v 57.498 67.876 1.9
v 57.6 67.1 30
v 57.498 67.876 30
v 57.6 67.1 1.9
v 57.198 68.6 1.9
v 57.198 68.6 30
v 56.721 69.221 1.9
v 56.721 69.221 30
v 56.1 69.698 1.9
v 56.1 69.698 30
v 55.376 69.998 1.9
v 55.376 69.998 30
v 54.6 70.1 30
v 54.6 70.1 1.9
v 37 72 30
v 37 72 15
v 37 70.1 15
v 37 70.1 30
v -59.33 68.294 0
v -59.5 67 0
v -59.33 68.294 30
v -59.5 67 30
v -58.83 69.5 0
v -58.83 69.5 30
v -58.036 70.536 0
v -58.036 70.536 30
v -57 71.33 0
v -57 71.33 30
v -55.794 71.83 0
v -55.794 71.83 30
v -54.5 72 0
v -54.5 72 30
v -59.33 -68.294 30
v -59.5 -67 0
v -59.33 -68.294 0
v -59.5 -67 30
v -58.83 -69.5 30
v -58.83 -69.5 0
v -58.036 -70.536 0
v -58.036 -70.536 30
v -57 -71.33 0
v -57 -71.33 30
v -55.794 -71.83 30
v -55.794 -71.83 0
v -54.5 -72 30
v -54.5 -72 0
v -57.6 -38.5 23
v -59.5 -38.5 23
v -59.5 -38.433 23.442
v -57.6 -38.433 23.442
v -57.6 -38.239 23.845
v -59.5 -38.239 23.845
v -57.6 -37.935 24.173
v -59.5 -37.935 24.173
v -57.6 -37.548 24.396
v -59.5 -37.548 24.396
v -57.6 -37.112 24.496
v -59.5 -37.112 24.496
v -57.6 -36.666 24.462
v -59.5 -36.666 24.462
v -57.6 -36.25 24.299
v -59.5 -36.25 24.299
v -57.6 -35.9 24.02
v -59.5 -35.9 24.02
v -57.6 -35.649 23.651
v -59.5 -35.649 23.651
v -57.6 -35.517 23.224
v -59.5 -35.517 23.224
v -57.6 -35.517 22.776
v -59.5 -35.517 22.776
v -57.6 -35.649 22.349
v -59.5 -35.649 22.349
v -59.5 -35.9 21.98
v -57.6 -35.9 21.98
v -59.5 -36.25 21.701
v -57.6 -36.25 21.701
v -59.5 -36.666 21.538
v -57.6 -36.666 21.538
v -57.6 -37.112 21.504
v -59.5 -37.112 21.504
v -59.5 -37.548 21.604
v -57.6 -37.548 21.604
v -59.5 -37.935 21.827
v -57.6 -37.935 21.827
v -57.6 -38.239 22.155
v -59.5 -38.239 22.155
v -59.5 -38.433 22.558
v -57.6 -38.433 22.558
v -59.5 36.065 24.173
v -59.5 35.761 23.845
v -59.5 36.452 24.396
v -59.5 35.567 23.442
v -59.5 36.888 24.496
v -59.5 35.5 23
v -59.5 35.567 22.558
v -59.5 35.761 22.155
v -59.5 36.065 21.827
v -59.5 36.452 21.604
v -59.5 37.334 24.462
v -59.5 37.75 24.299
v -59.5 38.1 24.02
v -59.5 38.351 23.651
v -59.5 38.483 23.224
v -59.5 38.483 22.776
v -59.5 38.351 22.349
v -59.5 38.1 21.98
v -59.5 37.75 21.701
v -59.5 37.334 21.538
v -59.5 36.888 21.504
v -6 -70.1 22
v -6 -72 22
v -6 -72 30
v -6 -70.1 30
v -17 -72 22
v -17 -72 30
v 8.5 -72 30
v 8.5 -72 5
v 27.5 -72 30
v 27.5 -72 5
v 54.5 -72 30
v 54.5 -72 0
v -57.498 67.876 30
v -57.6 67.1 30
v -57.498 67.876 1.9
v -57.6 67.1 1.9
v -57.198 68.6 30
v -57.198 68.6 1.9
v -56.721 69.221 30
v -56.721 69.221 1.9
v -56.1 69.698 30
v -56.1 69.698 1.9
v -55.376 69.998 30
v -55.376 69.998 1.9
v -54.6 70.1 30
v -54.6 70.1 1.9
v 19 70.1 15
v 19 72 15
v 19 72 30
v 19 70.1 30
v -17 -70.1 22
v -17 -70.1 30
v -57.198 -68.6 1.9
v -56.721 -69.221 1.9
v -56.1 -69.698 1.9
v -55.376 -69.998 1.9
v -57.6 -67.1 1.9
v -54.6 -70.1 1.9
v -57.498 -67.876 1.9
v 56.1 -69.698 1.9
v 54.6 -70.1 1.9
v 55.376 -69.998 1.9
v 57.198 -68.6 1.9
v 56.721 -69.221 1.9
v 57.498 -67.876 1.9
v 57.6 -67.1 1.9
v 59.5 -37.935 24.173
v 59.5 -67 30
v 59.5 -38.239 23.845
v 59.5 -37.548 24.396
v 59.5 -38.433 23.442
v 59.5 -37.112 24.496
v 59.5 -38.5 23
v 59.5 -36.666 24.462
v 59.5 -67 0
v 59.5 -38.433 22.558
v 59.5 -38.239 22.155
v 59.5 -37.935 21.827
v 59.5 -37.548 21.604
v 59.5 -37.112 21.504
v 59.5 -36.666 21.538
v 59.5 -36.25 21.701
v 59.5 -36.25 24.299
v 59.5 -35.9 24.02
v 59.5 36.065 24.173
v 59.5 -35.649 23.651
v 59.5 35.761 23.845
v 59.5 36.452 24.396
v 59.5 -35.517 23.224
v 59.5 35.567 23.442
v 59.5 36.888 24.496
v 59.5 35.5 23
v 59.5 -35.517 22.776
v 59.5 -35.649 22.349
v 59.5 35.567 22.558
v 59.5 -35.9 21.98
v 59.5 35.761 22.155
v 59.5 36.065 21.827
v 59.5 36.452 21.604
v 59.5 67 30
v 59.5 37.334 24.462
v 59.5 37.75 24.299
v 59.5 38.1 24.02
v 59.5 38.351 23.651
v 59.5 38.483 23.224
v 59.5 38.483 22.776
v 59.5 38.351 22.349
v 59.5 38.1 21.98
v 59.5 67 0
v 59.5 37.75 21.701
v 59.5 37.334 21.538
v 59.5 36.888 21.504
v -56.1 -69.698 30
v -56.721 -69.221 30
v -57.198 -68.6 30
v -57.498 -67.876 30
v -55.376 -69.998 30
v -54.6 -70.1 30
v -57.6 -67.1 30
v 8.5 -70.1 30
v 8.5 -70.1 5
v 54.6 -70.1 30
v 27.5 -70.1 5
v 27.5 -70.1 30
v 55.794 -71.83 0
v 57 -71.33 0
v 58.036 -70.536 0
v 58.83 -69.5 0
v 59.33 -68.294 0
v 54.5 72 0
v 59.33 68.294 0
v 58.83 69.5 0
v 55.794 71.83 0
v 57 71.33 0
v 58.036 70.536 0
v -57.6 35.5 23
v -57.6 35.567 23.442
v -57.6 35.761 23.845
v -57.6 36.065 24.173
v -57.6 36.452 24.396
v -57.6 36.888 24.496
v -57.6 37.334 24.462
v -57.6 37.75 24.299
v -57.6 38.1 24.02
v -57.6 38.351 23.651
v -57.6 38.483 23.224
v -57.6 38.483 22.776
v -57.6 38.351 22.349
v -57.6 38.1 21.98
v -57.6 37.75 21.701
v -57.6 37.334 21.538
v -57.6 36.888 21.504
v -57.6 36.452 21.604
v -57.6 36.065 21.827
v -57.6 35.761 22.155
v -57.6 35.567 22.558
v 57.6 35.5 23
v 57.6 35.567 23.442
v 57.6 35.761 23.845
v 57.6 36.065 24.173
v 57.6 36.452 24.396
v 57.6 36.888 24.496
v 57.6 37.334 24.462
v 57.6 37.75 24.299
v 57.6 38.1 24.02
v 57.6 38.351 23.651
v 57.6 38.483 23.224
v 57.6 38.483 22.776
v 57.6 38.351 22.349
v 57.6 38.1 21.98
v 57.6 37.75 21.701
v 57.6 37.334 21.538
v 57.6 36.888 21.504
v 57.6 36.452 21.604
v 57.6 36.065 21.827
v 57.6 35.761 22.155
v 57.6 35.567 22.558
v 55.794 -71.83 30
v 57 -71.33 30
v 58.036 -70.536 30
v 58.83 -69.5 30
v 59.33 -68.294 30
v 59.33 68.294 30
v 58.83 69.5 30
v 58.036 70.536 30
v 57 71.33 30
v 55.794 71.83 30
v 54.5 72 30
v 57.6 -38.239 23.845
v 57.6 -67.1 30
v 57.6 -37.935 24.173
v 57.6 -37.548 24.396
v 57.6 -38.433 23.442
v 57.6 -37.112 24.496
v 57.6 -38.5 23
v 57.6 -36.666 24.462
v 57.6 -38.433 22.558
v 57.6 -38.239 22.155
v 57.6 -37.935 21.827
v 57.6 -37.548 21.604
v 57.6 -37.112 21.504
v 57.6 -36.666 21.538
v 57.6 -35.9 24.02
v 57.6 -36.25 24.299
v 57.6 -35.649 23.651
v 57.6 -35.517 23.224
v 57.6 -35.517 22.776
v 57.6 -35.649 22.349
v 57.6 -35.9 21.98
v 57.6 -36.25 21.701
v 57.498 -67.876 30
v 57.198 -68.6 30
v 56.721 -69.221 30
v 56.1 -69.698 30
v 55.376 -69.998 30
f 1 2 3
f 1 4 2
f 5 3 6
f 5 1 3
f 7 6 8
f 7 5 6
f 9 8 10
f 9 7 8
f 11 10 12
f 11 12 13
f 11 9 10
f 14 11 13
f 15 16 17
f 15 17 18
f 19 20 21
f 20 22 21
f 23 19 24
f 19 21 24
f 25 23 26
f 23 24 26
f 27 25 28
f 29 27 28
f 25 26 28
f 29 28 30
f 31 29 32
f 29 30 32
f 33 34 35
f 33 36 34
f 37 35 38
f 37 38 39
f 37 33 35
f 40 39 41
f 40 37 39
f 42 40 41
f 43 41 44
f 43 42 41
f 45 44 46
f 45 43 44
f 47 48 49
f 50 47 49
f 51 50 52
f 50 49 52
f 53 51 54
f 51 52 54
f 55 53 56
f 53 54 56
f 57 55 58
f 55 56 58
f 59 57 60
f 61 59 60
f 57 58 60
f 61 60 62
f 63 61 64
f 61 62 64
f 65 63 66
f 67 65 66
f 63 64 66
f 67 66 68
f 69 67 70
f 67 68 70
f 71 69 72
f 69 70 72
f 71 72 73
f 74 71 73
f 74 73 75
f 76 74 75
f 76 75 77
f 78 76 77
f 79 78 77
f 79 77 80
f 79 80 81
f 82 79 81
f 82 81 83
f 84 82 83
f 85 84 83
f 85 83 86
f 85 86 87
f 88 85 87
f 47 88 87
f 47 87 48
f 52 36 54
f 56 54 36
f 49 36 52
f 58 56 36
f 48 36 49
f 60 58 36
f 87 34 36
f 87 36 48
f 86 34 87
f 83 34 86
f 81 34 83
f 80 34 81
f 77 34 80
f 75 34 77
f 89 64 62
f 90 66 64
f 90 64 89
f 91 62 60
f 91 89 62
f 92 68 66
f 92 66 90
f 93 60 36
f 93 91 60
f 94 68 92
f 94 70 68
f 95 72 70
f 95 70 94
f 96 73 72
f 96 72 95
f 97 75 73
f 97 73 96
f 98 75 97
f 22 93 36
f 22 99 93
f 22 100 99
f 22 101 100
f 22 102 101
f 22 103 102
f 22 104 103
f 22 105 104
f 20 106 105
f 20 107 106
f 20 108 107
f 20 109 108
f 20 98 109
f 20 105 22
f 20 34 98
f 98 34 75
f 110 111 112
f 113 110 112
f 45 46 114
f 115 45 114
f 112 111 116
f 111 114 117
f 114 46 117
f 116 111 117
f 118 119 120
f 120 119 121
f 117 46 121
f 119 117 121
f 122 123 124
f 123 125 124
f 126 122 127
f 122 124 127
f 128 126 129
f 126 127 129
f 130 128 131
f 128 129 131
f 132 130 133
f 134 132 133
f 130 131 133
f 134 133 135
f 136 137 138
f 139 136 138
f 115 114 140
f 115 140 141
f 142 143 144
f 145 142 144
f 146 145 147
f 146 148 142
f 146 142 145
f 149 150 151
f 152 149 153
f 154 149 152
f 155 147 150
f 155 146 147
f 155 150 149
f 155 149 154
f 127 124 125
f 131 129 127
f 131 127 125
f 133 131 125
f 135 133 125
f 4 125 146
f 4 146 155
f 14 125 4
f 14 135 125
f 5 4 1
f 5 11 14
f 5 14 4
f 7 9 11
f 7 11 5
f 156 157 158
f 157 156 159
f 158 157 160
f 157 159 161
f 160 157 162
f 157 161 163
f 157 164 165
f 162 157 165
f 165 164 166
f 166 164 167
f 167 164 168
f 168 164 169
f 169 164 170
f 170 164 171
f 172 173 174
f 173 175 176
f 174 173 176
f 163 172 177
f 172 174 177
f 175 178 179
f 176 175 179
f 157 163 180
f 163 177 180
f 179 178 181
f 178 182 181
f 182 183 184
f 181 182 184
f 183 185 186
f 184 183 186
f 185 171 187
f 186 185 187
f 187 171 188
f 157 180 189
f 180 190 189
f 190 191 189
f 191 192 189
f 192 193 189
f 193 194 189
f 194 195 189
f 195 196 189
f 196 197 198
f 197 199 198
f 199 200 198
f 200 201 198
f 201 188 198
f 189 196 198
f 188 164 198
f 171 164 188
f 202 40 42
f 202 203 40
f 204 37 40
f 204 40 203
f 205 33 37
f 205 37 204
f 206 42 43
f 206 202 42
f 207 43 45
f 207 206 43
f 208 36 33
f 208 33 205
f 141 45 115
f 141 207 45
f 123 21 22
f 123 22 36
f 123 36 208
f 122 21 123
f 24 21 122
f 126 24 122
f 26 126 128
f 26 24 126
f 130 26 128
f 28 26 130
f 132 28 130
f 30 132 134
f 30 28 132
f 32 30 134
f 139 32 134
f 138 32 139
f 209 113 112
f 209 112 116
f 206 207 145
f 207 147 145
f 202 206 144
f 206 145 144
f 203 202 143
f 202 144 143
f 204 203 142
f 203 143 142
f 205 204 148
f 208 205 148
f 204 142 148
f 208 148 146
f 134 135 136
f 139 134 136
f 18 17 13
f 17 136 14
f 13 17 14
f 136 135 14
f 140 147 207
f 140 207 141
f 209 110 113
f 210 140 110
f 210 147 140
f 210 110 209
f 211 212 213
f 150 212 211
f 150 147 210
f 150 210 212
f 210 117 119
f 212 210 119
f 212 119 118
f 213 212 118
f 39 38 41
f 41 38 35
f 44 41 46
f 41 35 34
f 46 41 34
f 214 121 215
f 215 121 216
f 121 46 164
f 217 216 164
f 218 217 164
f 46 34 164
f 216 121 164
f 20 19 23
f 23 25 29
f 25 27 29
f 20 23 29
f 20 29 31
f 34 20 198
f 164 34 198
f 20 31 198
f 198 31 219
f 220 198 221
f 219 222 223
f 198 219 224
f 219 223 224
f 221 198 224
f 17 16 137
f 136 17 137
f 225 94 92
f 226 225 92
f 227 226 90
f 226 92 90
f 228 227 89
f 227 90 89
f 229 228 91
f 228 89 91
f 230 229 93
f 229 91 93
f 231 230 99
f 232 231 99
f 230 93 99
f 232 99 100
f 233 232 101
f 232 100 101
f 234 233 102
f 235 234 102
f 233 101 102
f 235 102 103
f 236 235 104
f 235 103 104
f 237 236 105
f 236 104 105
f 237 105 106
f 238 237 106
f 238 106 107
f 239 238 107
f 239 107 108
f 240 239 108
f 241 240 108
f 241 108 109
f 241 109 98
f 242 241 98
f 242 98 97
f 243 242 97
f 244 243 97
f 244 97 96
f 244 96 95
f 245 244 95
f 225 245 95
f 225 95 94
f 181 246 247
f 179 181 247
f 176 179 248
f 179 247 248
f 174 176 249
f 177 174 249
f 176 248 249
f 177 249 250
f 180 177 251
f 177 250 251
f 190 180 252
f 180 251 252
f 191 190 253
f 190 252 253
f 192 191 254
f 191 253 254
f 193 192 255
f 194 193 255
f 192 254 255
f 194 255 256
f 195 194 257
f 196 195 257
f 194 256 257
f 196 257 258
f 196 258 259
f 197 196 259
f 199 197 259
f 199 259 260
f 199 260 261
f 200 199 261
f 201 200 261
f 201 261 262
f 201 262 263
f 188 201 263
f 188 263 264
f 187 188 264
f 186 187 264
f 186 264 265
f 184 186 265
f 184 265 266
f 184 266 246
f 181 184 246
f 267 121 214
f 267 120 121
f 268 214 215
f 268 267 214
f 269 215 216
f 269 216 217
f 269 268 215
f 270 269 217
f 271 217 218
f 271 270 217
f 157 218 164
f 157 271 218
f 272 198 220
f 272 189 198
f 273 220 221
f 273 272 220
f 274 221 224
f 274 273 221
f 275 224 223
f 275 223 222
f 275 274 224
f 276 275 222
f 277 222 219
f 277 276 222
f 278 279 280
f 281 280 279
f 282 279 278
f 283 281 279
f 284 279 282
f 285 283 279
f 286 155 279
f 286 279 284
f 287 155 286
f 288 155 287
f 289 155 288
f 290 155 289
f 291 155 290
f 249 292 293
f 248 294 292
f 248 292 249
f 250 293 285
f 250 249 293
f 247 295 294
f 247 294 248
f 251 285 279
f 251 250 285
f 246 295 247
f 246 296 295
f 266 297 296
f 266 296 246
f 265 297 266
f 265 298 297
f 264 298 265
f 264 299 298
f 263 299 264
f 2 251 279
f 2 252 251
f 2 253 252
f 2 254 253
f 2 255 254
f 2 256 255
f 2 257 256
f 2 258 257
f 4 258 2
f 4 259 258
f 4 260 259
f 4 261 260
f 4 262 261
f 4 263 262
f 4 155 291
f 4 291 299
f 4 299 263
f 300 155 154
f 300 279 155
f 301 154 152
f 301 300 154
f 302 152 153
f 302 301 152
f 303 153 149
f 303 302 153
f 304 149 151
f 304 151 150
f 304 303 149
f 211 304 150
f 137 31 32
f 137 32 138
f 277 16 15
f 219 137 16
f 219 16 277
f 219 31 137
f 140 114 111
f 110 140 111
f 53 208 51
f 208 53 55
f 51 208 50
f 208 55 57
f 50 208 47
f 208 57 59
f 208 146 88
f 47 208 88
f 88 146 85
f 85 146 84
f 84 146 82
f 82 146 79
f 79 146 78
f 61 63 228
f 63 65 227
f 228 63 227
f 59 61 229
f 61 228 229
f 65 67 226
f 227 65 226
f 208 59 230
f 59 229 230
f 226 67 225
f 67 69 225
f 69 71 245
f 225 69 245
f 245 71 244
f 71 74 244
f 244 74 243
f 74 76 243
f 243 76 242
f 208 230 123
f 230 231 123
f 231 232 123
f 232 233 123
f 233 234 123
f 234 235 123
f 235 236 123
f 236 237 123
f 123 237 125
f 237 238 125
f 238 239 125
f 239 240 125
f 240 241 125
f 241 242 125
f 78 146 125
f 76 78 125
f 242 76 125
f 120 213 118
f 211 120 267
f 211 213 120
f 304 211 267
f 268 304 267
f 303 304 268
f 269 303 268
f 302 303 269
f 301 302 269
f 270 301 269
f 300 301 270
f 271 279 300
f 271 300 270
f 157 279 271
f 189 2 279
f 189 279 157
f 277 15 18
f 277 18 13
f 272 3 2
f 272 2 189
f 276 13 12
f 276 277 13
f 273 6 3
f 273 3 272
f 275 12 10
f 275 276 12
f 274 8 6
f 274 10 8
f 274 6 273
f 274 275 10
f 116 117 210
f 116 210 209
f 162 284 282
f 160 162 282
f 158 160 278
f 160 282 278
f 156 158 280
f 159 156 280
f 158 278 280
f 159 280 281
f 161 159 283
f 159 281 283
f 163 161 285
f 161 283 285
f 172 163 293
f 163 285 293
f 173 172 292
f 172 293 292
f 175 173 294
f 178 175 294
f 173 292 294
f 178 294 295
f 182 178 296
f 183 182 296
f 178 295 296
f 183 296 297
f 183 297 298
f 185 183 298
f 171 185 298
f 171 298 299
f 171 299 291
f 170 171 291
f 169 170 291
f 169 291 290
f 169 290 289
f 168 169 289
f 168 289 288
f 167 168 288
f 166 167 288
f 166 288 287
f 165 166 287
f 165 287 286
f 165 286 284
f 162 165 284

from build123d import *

# Parameters (mm, degrees)
F0_W      = 119
F0_H      = 144
F1_DEPTH  = 30
F2_T      = -1.9
F3_R      = 5
F4_R      = 3
F5_R      = 1.5
F6_DEPTH  = 119.001
F7_W      = 19
F7_H      = 25
F7_W_2    = 11
F7_H_2    = 8
F8_DEPTH  = 3
F9_W      = 18
F9_H      = 15
F10_DEPTH = 3


with BuildPart() as f1:
    # F0 (on Top) → F1 (new body)
    with BuildSketch(Plane.XY):
        Rectangle(F0_W, F0_H)
    extrude(amount=F1_DEPTH)

    # F2
    f2_openings = [f1.faces().sort_by_distance(p)[0] for p in [
        (0, 0, 30),
    ]]
    offset(amount=F2_T, openings=f2_openings)

    # F3
    f3_edges = [f1.edges().sort_by_distance(p)[0] for p in [
        (-59.5, -72, 15),
        (59.5, -72, 15),
        (59.5, 72, 15),
        (-59.5, 72, 15),
    ]]
    fillet(f3_edges, radius=F3_R)

    # F4
    f4_edges = [f1.edges().sort_by_distance(p)[0] for p in [
        (-57.6, -70.1, 15.95),
        (57.6, -70.1, 15.95),
        (-57.6, 70.1, 15.95),
        (57.6, 70.1, 15.95),
    ]]
    fillet(f4_edges, radius=F4_R)

    # F5 (on face) → F6 (cut, through all)
    with BuildSketch(Plane(origin=(-59.5, 0, 0), x_dir=(0, -1, 0), z_dir=(-1, 0, 0))):
        with Locations((-37, 23)):
            Circle(F5_R)
        with Locations((37, 23)):
            Circle(F5_R)
    extrude(amount=-F6_DEPTH, mode=Mode.SUBTRACT)

    # F7 (on face) → F8 (cut)
    with BuildSketch(Plane.XZ.offset(72)):
        with Locations((18, 17.5)):
            Rectangle(F7_W, F7_H)
        with Locations((-11.5, 26)):
            Rectangle(F7_W_2, F7_H_2)
    extrude(amount=-F8_DEPTH, mode=Mode.SUBTRACT)

    # F9 (on face) → F10 (cut)
    with BuildSketch(Plane(origin=(0, 72, 0), x_dir=(-1, 0, 0), z_dir=(0, 1, 0))):
        with Locations((-28, 22.5)):
            Rectangle(F9_W, F9_H)
    extrude(amount=-F10_DEPTH, mode=Mode.SUBTRACT)


solid = f1.part
